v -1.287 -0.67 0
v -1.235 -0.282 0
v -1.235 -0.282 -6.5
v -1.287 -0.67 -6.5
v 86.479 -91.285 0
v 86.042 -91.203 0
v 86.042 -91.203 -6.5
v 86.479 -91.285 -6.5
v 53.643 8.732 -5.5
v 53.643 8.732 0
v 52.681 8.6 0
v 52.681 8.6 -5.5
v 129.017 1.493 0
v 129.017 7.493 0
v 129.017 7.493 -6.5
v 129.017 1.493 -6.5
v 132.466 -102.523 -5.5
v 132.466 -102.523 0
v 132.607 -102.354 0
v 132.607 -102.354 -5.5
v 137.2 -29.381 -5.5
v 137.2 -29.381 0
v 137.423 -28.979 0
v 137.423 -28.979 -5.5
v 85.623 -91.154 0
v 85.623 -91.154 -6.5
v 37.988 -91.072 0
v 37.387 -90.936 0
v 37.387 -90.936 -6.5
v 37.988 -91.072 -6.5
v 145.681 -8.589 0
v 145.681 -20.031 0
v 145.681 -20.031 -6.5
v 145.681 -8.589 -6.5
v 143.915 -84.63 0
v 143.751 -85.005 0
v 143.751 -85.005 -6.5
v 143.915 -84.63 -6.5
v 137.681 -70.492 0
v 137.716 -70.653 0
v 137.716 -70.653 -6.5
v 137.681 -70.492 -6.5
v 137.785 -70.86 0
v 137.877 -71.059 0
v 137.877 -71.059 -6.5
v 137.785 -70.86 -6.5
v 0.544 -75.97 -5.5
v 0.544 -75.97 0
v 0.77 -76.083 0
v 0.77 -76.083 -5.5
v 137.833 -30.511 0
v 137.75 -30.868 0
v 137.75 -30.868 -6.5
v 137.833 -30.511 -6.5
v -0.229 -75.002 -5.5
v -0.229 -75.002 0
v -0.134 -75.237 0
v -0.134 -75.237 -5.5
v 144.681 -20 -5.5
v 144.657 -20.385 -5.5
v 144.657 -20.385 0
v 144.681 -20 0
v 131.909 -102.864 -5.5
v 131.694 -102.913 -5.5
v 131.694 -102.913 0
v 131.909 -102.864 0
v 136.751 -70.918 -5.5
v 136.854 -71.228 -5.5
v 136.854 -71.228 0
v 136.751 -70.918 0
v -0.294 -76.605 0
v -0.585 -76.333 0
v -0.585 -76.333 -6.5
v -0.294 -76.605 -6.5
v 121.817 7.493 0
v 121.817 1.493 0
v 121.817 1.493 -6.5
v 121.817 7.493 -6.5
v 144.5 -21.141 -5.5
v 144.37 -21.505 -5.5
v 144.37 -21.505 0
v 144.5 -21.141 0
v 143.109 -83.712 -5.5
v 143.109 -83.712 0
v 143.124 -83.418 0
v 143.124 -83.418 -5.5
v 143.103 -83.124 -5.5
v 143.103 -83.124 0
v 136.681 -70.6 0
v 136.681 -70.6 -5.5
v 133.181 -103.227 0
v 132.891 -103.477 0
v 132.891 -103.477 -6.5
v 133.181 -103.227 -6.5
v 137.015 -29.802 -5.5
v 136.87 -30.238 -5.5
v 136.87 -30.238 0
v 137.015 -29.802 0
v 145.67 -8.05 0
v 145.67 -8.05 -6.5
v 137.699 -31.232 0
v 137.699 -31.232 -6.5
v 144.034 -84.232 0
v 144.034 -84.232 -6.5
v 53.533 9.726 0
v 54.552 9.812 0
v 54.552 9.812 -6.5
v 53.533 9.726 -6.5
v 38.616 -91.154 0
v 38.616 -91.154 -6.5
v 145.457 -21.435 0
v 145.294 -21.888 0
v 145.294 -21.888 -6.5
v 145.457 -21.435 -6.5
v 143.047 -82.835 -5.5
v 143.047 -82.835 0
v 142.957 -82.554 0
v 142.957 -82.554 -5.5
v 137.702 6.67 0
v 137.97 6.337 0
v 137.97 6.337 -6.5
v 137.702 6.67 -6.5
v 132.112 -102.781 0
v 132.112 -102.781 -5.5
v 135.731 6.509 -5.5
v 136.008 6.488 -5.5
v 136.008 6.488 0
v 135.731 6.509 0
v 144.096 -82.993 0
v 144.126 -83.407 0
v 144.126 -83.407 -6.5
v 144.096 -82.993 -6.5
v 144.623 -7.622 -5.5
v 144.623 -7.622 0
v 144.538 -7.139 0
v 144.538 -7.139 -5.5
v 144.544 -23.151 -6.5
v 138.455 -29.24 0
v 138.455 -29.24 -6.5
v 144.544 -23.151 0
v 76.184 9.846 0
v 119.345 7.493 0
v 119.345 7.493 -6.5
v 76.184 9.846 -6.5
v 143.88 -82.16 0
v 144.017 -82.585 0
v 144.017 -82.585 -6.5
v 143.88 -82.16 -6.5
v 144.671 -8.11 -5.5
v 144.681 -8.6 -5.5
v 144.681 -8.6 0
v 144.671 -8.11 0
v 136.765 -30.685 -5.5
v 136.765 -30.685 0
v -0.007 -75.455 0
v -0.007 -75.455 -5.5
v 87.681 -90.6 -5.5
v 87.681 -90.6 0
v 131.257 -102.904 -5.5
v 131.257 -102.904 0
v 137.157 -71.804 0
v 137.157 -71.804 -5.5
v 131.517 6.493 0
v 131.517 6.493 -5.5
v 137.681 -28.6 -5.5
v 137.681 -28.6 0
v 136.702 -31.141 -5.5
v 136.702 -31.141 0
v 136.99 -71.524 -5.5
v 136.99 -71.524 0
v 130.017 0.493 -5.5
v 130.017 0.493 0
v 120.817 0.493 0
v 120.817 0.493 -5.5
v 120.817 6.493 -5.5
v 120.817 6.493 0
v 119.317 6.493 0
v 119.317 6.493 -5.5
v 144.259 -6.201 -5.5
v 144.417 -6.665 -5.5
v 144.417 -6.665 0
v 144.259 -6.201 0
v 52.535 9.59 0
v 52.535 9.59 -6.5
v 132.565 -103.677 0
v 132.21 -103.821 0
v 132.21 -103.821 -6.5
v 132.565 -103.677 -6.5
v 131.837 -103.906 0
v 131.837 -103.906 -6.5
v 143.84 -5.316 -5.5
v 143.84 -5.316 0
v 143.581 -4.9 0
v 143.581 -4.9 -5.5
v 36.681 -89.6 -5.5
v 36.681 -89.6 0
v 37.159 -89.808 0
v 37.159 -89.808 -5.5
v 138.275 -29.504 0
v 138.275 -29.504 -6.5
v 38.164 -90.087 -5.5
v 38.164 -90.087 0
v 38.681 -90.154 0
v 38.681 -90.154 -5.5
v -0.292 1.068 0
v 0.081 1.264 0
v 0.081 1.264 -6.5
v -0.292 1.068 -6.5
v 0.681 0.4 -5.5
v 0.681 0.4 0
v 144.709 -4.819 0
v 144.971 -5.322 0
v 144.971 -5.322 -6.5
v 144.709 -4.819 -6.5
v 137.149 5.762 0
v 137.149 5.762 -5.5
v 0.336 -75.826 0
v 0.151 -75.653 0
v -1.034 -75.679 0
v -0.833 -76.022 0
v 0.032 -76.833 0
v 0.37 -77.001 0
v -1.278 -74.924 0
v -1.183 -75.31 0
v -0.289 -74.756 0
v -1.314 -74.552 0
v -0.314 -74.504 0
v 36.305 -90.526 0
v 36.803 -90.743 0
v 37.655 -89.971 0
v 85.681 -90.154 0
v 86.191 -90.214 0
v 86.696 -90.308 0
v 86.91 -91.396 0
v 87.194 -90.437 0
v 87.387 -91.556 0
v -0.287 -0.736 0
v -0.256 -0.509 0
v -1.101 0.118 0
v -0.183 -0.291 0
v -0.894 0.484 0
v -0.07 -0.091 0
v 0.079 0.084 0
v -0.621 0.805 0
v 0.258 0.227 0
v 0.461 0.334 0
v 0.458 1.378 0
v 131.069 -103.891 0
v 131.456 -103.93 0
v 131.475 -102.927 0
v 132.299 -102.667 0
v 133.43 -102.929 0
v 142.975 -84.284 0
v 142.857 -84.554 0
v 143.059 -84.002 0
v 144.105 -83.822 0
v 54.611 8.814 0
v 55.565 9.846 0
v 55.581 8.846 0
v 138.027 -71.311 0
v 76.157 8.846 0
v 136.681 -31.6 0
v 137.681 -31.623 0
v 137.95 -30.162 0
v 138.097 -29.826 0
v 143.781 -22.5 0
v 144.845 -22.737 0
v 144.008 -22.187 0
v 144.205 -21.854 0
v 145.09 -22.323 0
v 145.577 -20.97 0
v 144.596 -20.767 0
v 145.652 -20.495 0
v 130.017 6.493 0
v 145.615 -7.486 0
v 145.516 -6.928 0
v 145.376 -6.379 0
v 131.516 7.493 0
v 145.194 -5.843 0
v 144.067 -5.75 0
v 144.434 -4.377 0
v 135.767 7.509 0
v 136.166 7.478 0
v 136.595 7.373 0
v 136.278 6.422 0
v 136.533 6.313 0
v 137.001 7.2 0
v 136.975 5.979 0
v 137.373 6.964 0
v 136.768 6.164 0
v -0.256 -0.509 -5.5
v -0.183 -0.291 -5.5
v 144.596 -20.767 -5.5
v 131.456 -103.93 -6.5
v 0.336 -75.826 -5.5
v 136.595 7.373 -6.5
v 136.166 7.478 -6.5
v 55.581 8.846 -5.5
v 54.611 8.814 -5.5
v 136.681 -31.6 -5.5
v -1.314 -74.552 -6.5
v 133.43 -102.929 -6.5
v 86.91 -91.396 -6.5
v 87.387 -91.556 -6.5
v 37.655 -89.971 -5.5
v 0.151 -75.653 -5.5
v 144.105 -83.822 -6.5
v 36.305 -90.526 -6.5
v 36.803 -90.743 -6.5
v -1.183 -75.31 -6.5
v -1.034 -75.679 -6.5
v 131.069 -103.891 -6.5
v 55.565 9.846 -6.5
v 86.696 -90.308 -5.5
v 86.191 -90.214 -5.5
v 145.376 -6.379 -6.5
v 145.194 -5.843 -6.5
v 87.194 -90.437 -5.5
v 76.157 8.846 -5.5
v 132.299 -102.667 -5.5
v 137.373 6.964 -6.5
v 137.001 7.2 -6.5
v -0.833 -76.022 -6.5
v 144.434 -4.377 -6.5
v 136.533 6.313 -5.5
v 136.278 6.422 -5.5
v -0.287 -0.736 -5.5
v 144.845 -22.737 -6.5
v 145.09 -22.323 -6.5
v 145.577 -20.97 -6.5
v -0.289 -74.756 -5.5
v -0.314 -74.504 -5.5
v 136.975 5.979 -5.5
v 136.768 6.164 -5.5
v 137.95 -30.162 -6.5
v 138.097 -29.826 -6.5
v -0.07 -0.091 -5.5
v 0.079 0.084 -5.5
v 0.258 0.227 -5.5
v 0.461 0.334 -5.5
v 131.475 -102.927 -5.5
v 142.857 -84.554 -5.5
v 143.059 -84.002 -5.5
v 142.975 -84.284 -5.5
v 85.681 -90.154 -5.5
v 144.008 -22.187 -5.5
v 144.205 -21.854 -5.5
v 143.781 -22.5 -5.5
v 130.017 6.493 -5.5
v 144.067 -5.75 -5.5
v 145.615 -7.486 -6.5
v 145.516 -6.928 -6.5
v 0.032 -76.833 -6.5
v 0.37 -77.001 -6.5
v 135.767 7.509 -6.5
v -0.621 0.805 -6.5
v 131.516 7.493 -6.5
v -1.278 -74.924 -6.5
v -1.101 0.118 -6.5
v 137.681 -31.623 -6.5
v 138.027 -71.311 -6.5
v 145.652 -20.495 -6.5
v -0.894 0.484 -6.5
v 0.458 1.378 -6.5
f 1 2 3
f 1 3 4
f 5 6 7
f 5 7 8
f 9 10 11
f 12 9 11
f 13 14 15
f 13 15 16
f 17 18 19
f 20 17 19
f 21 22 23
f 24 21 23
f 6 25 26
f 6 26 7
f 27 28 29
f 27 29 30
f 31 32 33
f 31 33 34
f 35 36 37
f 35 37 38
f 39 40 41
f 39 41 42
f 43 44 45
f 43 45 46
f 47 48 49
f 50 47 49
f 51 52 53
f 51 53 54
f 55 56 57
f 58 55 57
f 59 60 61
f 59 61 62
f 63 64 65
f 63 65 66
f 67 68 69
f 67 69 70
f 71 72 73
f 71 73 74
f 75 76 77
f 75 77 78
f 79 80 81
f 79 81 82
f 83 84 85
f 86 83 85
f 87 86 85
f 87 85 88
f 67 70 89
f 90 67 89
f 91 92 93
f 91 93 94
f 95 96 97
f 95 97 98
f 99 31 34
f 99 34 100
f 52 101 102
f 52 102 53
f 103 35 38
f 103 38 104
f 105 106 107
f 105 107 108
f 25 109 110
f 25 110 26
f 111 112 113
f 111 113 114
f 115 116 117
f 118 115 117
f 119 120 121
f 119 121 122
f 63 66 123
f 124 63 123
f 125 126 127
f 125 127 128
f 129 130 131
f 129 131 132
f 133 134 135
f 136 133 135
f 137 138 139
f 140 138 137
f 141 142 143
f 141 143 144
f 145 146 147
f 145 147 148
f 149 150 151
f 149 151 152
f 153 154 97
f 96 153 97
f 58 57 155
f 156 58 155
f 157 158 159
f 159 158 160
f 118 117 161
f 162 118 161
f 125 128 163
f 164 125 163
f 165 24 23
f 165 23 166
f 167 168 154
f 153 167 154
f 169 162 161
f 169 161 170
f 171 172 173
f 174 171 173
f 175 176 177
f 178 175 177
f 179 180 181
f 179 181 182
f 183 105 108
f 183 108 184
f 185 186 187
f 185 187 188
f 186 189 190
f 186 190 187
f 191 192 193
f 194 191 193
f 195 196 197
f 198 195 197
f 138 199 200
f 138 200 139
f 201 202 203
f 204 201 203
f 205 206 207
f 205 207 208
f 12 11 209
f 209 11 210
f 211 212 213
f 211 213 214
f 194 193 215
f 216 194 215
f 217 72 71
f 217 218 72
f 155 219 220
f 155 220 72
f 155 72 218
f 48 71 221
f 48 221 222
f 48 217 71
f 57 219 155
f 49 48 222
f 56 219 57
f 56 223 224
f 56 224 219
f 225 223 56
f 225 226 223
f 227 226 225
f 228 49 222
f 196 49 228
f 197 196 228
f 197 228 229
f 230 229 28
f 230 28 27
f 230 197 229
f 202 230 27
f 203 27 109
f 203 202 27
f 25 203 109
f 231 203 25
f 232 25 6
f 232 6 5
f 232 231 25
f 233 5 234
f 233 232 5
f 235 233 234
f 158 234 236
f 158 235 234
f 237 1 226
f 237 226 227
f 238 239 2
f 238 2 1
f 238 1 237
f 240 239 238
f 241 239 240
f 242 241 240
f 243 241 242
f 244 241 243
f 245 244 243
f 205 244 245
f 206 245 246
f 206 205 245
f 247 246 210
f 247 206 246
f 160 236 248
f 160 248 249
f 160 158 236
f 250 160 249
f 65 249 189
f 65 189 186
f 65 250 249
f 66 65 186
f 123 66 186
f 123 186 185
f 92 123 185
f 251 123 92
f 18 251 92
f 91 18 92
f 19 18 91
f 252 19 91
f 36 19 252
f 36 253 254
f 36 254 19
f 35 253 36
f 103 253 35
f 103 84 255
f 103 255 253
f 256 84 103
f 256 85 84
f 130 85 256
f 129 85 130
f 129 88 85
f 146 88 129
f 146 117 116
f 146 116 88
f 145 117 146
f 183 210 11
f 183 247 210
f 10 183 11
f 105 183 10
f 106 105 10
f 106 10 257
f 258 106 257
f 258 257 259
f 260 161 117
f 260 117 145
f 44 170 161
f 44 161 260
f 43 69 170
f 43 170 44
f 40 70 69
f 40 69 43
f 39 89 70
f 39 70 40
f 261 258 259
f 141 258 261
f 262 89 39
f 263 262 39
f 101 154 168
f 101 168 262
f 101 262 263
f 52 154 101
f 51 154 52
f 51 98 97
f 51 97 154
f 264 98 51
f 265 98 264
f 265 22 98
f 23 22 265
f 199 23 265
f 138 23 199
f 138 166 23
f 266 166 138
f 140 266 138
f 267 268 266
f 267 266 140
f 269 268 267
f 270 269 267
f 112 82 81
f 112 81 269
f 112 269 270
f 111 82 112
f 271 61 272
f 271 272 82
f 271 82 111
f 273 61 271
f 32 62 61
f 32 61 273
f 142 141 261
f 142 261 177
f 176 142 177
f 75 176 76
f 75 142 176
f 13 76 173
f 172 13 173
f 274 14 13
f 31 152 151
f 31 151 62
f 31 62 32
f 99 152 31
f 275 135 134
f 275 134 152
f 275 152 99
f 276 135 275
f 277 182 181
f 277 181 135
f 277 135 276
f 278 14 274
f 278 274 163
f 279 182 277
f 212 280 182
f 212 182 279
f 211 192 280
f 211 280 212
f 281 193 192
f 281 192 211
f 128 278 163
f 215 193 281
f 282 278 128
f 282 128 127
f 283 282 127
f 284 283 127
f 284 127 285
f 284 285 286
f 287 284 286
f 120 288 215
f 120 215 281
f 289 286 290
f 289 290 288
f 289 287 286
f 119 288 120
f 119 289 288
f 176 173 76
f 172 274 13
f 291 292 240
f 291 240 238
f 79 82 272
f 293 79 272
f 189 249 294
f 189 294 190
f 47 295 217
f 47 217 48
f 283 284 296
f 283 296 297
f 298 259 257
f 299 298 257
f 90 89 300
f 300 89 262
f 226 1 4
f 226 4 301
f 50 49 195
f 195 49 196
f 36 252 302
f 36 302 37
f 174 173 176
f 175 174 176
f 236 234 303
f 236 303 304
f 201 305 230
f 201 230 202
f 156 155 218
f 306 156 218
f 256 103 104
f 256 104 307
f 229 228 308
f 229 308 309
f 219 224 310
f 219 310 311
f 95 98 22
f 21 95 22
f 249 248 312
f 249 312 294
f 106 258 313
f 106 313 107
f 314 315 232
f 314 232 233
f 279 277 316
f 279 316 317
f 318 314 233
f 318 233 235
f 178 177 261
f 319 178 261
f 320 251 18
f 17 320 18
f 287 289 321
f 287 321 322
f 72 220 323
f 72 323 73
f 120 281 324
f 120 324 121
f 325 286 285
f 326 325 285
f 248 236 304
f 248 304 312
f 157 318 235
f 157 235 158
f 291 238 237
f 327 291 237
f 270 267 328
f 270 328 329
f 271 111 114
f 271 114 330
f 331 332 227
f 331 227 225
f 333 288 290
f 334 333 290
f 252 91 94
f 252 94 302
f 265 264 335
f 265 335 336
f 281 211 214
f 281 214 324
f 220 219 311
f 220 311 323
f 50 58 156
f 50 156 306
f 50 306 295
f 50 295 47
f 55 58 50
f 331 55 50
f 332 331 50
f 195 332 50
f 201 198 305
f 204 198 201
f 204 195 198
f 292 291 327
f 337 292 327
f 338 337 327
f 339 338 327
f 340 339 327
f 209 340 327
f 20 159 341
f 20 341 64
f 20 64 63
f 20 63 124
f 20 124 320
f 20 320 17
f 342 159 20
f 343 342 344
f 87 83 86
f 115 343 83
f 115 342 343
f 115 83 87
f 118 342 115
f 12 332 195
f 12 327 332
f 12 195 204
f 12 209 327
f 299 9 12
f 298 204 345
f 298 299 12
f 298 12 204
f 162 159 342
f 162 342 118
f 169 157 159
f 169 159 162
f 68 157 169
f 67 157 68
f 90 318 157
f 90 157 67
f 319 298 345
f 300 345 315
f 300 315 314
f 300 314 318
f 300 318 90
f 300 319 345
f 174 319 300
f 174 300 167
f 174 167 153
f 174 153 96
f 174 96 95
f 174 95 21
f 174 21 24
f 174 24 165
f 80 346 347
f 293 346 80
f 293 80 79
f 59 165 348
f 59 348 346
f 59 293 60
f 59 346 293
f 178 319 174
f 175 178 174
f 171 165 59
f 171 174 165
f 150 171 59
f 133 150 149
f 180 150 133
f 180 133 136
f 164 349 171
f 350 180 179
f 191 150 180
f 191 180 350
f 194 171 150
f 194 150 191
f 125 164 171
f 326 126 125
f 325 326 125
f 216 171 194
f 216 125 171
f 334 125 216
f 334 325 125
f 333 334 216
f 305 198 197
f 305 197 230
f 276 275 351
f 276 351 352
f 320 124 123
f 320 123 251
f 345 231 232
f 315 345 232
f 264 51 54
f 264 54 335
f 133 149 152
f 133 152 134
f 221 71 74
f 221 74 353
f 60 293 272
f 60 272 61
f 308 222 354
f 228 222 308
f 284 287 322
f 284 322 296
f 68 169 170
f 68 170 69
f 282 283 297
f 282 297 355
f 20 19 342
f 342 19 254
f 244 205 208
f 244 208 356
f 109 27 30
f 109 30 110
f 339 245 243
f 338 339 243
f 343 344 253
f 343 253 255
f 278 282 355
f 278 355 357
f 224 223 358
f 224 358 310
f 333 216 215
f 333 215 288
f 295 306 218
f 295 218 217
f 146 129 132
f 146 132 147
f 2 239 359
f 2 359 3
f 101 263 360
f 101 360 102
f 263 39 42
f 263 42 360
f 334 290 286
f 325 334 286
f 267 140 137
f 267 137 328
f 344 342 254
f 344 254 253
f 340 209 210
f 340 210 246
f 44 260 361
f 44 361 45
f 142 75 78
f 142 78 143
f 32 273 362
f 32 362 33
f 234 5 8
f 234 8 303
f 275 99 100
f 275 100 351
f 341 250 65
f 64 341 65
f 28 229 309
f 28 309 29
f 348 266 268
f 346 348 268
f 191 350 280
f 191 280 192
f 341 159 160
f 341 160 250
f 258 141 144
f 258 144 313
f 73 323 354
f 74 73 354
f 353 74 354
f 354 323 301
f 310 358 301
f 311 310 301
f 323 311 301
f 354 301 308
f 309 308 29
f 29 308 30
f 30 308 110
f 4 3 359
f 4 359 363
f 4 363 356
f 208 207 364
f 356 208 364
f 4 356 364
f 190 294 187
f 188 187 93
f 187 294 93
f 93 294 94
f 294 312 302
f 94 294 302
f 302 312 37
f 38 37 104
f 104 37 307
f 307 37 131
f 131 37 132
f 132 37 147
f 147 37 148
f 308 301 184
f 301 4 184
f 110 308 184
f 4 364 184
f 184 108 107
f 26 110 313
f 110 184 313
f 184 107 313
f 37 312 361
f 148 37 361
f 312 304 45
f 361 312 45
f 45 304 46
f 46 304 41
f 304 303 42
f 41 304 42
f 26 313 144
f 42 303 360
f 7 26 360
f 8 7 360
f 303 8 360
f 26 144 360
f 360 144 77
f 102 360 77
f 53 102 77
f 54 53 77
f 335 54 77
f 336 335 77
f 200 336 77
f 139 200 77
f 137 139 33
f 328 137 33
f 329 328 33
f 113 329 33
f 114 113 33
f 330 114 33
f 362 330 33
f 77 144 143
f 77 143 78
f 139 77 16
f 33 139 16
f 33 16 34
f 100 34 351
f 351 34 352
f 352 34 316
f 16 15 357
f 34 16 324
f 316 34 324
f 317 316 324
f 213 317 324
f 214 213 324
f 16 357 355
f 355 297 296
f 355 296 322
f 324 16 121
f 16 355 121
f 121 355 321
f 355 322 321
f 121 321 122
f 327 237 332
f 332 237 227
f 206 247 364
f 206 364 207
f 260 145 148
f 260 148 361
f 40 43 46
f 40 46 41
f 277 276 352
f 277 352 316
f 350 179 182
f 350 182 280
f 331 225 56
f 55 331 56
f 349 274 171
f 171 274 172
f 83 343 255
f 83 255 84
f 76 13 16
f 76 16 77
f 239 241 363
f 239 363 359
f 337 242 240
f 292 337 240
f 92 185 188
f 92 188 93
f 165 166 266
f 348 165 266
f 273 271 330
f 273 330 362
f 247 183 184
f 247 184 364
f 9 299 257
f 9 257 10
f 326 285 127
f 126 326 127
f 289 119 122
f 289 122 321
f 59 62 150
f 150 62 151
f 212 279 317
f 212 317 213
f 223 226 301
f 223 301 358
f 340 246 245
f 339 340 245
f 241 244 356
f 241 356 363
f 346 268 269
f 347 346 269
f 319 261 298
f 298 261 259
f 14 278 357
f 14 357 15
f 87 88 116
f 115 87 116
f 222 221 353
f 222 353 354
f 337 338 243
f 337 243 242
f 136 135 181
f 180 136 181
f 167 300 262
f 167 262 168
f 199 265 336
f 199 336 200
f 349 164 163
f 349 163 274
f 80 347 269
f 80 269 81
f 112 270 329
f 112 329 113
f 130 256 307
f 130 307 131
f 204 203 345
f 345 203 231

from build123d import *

# Parameters (mm, degrees)
BOSS_EXTRU_1_DEPTH = 6.5
COQUE1_T           = -1


with BuildPart() as part:
    # Esquisse1 → Boss.-Extru.1 (new body)
    with BuildSketch(Plane.XY):
        Polygon((121.817464, 7.492943), (119.344698096, 7.492943), (76.183818096, 9.845583), (55.564779836, 9.845583), (54.552173404, 9.812435234), (53.533209696, 9.726302114), (52.535480793, 9.589824274), (0.457881428, 1.377587451), (0.080923827, 1.263928085), (-0.29188868, 1.068065272), (-0.62076937, 0.805019767), (-0.893764513, 0.484354906), (-1.100960827, 0.11771658), (-1.234846295, -0.281630821), (-1.286572721, -0.669801542), (-1.313614475, -74.551979081), (-1.278040024, -74.923678753), (-1.183440664, -75.310181205), (-1.034124026, -75.679013791), (-0.83321163, -76.022476002), (-0.584894436, -76.333396945), (-0.29436239, -76.605283146), (0.032415912, -76.832524633), (0.369780396, -77.00084256), (36.304970835, -90.526464897), (36.80277452, -90.74345953), (37.387467468, -90.935559968), (37.987559572, -91.072151235), (38.615965116, -91.154417), (85.623172099, -91.154417), (86.041723807, -91.203108273), (86.479101326, -91.284778635), (86.909816867, -91.396315659), (87.386772904, -91.555543407), (131.068933438, -103.89053292), (131.455504757, -103.929660689), (131.837402239, -103.90606587), (132.210442209, -103.820965251), (132.564787964, -103.676607455), (132.89109687, -103.476794608), (133.180788715, -103.226774051), (133.429739598, -102.92886536), (143.750781449, -85.005495121), (143.915060156, -84.629514823), (144.034345378, -84.231627617), (144.104871469, -83.822278759), (144.125612773, -83.407413185), (144.096265486, -82.993066766), (144.017262186, -82.585292428), (143.880179871, -82.160245981), (138.026657959, -71.311045886), (137.876543424, -71.058845944), (137.78546804, -70.860016908), (137.716227615, -70.652585277), (137.681143, -70.491756357), (137.681143, -31.622548821), (137.6990854, -31.232462255), (137.749599164, -30.868463071), (137.833314637, -30.510636851), (137.949524742, -30.162007333), (138.097248212, -29.82551681), (138.275237168, -29.504008987), (138.454865034, -29.240054529), (144.543883236, -23.151036326), (144.845002348, -22.736623208), (145.089736472, -22.322824981), (145.294432727, -21.887826778), (145.457273896, -21.435491716), (145.576812433, -20.969836233), (145.651988542, -20.494996542), (145.681143, -20.030945018), (145.681143, -8.589075407), (145.669842672, -8.050387206), (145.61465745, -7.486457006), (145.516495569, -6.928400528), (145.37593068, -6.379489779), (145.193788673, -5.842940054), (144.971135156, -5.321894978), (144.70927891, -4.819414981), (144.433744876, -4.376954091), (137.970333494, 6.337024694), (137.701988909, 6.669821714), (137.372955521, 6.963781332), (137.000567914, 7.200433726), (136.594704241, 7.373498612), (136.166125996, 7.47838751), (135.767380568, 7.509136644), (131.515559688, 7.492943), (129.017464, 7.492943), (129.017464, 1.492943), (121.817464, 1.492943), align=None)
    extrude(amount=-BOSS_EXTRU_1_DEPTH)

    # Coque1
    coque1_openings = [part.faces().sort_by_distance(p)[0] for p in [
        (72.557857735, -42.2287033, 0),
    ]]
    offset(amount=COQUE1_T, openings=coque1_openings, kind=Kind.INTERSECTION)


solid = part.part
